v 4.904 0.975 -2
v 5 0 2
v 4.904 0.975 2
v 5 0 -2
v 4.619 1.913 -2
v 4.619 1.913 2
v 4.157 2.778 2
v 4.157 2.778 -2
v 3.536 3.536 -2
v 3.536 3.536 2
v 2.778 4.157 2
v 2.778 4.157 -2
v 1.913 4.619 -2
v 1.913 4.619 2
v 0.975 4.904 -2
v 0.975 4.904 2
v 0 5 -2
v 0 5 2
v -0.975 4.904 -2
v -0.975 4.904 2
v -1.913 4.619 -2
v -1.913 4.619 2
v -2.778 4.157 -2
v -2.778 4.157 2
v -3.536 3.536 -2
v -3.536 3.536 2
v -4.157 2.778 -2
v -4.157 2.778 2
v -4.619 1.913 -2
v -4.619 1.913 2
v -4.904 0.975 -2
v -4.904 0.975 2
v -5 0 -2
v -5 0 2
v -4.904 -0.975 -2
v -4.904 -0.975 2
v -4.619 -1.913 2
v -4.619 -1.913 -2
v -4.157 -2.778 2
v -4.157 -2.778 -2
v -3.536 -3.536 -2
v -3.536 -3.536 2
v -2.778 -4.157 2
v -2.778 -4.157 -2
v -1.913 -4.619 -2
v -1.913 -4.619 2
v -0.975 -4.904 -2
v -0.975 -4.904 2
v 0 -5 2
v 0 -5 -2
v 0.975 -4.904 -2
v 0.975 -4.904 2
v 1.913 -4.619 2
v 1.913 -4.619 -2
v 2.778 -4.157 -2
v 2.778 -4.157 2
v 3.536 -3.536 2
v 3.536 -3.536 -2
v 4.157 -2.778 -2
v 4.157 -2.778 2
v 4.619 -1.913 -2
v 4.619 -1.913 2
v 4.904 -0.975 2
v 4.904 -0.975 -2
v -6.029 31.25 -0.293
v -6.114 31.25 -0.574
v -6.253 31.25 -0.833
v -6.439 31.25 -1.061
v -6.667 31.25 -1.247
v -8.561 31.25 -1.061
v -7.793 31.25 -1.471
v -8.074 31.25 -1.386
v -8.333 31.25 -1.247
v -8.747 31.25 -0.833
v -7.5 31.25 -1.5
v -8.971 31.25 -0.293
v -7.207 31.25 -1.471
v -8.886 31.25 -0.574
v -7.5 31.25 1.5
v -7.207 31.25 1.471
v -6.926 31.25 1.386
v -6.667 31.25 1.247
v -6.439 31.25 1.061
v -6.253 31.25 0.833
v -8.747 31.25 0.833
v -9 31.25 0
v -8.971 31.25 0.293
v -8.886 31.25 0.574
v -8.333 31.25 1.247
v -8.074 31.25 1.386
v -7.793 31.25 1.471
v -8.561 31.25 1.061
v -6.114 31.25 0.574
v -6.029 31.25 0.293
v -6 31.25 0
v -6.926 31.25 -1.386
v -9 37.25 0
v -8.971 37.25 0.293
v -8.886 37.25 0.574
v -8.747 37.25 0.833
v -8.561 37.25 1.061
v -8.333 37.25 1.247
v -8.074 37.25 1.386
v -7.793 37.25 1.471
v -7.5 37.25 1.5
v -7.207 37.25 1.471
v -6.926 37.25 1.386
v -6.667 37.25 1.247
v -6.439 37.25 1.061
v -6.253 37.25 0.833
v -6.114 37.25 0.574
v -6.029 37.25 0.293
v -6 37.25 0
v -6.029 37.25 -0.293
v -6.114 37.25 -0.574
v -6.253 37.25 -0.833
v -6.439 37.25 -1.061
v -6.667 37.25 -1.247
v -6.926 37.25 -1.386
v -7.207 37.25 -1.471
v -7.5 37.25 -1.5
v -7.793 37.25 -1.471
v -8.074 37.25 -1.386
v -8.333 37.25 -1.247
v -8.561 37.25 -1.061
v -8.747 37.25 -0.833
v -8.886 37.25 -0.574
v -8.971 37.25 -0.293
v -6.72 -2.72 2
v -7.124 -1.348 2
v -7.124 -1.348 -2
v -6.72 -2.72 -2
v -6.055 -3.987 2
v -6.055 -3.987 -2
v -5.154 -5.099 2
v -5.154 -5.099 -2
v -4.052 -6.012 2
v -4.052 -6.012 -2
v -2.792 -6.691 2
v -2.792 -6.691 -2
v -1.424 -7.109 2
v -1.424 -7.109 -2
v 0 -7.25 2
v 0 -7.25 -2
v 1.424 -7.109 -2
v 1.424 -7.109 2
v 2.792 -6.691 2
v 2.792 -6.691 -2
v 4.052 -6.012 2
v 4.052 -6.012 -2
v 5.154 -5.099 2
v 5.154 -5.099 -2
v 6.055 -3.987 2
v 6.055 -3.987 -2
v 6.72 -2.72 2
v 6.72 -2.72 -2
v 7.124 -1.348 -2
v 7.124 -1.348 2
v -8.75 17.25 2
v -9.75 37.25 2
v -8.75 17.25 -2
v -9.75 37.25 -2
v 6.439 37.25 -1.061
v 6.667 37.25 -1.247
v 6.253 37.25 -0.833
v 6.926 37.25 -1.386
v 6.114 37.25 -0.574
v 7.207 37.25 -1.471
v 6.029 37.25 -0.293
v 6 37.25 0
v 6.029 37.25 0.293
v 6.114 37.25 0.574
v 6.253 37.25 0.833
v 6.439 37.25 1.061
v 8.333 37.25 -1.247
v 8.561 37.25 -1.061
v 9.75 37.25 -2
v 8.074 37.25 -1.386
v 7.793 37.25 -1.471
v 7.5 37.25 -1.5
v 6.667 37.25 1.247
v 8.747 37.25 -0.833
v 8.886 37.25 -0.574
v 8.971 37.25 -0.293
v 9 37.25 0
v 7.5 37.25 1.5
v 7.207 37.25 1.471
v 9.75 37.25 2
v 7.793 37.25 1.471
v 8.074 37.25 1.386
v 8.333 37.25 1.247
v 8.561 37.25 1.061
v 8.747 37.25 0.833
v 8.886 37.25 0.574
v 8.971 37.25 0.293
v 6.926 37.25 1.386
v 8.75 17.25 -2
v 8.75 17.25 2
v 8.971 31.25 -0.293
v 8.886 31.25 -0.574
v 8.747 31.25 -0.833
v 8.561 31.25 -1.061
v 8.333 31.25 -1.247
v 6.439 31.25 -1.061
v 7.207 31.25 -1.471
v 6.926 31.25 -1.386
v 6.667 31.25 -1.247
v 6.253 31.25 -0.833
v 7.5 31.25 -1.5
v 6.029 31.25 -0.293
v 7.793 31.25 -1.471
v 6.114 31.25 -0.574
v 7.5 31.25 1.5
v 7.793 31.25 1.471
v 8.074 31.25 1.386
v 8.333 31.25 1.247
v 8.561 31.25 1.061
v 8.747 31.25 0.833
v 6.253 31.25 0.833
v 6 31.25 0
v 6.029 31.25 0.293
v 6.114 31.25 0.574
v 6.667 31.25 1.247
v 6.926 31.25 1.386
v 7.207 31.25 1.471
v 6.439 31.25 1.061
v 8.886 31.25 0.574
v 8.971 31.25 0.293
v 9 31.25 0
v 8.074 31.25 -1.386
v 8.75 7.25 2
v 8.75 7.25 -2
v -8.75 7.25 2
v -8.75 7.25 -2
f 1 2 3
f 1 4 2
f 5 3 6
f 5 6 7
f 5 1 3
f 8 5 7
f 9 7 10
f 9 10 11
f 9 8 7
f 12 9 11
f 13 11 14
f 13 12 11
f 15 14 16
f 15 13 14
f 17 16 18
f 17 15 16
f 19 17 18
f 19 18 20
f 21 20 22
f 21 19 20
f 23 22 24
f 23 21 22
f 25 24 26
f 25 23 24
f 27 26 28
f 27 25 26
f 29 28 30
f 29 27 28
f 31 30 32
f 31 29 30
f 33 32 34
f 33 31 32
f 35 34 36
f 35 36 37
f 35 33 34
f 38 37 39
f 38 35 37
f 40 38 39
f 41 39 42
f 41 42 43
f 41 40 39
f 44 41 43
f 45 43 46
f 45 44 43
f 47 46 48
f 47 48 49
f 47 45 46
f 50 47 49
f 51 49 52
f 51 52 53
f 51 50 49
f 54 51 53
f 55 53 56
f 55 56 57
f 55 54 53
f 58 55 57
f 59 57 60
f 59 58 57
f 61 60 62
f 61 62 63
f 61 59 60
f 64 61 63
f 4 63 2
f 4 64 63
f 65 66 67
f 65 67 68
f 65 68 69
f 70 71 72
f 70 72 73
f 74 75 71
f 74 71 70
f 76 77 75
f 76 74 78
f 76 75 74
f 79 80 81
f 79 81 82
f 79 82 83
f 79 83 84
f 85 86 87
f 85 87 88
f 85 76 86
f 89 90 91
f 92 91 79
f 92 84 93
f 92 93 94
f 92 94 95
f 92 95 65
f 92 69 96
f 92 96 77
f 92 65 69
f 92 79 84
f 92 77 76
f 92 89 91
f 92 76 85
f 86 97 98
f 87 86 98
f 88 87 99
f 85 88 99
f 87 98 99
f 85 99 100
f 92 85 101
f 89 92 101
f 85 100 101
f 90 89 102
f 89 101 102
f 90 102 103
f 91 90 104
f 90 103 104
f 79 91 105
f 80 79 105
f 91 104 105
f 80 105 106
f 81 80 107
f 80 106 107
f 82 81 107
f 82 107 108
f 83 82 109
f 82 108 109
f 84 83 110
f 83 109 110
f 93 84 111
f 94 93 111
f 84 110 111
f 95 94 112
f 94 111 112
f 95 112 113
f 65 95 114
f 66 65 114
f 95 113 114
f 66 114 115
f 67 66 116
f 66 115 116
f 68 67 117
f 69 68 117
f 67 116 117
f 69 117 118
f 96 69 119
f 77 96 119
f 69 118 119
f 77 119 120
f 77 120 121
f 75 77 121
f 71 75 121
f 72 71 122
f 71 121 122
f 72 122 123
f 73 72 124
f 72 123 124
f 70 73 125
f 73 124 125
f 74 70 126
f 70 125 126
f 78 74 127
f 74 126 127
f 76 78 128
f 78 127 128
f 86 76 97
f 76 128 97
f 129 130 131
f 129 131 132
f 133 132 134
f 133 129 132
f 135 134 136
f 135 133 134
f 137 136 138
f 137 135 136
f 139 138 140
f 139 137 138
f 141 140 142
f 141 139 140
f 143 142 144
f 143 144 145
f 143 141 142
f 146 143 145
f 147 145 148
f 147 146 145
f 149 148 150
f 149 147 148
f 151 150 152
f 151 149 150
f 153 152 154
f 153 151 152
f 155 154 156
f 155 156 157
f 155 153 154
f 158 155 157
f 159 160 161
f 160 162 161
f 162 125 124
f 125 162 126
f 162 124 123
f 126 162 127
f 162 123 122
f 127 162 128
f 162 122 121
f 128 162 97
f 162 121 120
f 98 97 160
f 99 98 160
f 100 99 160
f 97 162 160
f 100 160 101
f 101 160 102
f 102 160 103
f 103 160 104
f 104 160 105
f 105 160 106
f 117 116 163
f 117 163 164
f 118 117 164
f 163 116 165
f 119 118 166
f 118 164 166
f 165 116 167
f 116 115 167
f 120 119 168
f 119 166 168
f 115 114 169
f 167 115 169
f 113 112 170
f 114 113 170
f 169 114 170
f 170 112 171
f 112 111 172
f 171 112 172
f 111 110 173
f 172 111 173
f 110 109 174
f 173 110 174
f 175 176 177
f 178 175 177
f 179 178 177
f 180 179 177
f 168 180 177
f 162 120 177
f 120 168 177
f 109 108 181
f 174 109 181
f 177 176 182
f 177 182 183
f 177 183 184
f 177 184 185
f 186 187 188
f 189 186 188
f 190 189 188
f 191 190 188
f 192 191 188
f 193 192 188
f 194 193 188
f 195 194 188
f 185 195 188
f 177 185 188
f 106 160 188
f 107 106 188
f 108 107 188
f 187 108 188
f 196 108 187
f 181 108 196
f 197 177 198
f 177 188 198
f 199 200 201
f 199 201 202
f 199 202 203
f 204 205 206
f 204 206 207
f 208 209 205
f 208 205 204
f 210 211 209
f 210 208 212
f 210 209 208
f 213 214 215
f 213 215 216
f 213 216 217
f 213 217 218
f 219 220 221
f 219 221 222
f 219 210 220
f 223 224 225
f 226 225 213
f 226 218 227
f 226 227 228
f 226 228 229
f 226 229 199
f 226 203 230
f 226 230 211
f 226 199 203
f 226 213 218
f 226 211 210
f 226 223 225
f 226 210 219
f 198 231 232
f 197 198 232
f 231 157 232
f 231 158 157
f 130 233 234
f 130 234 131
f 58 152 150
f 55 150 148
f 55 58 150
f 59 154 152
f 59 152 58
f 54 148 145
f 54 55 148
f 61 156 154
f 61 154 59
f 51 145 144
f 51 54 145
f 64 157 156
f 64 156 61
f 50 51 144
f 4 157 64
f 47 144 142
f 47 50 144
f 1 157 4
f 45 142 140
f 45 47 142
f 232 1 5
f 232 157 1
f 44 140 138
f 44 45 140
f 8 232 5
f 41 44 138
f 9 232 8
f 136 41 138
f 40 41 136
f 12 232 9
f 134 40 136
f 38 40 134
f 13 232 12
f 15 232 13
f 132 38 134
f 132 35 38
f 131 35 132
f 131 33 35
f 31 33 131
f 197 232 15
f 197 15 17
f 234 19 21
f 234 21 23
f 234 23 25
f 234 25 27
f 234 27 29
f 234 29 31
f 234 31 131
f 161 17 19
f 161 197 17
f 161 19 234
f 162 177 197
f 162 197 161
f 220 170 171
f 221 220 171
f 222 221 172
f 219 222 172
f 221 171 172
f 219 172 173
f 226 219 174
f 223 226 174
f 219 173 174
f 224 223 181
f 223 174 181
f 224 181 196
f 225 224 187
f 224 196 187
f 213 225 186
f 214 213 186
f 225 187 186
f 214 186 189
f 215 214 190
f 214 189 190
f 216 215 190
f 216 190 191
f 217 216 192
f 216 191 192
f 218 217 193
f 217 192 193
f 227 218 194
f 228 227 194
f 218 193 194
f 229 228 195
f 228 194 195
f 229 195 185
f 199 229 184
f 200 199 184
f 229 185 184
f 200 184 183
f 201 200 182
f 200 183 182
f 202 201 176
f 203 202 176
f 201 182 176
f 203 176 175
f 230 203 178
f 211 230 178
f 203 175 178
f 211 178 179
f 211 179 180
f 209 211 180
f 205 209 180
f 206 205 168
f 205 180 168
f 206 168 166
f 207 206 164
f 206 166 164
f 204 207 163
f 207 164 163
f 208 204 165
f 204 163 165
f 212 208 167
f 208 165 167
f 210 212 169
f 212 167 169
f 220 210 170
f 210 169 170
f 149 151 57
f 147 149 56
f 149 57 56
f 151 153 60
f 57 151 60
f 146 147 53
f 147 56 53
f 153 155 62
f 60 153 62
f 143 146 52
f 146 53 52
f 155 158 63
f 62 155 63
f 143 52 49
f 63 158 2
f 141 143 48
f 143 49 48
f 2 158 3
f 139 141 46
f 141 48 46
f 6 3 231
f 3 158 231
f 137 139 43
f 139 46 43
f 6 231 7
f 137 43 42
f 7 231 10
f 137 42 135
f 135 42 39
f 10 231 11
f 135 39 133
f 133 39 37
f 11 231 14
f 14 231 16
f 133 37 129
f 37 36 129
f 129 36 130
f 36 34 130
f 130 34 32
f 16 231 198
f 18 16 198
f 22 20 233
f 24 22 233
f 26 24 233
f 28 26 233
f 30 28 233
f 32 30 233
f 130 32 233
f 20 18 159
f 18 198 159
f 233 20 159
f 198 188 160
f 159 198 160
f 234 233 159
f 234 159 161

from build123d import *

# Parameters (mm, degrees)
SKETCH1_R           = 5
BOSS_EXTRUDE1_DEPTH = 2
SKETCH2_W           = 17.5
SKETCH2_H           = 4
BOSS_EXTRUDE2_DEPTH = 30
BOSS_EXTRUDE3_DEPTH = 2
SKETCH3_R           = 1.5
CUT_EXTRUDE1_DEPTH  = 6


with BuildPart() as part:
    # Sketch1 → Boss-Extrude1 (new, symmetric)
    with BuildSketch(Plane.XY):
        with BuildLine():
            Line((8.75, 7.25), (-8.75, 7.25))
            Line((-8.75, 7.25), (-7.123668925, -1.347531462))
            ThreePointArc((-7.123668925, -1.347531462), (0, -7.25), (7.123668925, -1.347531462))
            Line((7.123668925, -1.347531462), (8.75, 7.25))
        make_face()
        Circle(SKETCH1_R, mode=Mode.SUBTRACT)
    extrude(amount=BOSS_EXTRUDE1_DEPTH, both=True)

    # Sketch2 → Boss-Extrude2 (add)
    with BuildSketch(Plane(origin=(0, 7.25, 0), x_dir=(1, 0, 0), z_dir=(0, 1, 0))):
        Rectangle(SKETCH2_W, SKETCH2_H)
    extrude(amount=BOSS_EXTRUDE2_DEPTH)

    # Sketch4 → Boss-Extrude3 (add, symmetric)
    with BuildSketch(Plane.XY):
        Polygon((-8.75, 37.25), (-9.75, 37.25), (-8.75, 17.25), align=None)
        Polygon((8.75, 37.25), (9.75, 37.25), (8.75, 17.25), align=None)
    extrude(amount=BOSS_EXTRUDE3_DEPTH, both=True)

    # Sketch3 → Cut-Extrude1 (cut)
    with BuildSketch(Plane(origin=(0, 37.25, 0), x_dir=(1, 0, 0), z_dir=(0, 1, 0))):
        with Locations(Location((-7.5, 0, 0), (0, 0, 180))):
            Circle(SKETCH3_R)
        with Locations(Location((7.5, 0, 0), (0, 0, 180))):
            Circle(SKETCH3_R)
    extrude(amount=-CUT_EXTRUDE1_DEPTH, mode=Mode.SUBTRACT)


solid = part.part
